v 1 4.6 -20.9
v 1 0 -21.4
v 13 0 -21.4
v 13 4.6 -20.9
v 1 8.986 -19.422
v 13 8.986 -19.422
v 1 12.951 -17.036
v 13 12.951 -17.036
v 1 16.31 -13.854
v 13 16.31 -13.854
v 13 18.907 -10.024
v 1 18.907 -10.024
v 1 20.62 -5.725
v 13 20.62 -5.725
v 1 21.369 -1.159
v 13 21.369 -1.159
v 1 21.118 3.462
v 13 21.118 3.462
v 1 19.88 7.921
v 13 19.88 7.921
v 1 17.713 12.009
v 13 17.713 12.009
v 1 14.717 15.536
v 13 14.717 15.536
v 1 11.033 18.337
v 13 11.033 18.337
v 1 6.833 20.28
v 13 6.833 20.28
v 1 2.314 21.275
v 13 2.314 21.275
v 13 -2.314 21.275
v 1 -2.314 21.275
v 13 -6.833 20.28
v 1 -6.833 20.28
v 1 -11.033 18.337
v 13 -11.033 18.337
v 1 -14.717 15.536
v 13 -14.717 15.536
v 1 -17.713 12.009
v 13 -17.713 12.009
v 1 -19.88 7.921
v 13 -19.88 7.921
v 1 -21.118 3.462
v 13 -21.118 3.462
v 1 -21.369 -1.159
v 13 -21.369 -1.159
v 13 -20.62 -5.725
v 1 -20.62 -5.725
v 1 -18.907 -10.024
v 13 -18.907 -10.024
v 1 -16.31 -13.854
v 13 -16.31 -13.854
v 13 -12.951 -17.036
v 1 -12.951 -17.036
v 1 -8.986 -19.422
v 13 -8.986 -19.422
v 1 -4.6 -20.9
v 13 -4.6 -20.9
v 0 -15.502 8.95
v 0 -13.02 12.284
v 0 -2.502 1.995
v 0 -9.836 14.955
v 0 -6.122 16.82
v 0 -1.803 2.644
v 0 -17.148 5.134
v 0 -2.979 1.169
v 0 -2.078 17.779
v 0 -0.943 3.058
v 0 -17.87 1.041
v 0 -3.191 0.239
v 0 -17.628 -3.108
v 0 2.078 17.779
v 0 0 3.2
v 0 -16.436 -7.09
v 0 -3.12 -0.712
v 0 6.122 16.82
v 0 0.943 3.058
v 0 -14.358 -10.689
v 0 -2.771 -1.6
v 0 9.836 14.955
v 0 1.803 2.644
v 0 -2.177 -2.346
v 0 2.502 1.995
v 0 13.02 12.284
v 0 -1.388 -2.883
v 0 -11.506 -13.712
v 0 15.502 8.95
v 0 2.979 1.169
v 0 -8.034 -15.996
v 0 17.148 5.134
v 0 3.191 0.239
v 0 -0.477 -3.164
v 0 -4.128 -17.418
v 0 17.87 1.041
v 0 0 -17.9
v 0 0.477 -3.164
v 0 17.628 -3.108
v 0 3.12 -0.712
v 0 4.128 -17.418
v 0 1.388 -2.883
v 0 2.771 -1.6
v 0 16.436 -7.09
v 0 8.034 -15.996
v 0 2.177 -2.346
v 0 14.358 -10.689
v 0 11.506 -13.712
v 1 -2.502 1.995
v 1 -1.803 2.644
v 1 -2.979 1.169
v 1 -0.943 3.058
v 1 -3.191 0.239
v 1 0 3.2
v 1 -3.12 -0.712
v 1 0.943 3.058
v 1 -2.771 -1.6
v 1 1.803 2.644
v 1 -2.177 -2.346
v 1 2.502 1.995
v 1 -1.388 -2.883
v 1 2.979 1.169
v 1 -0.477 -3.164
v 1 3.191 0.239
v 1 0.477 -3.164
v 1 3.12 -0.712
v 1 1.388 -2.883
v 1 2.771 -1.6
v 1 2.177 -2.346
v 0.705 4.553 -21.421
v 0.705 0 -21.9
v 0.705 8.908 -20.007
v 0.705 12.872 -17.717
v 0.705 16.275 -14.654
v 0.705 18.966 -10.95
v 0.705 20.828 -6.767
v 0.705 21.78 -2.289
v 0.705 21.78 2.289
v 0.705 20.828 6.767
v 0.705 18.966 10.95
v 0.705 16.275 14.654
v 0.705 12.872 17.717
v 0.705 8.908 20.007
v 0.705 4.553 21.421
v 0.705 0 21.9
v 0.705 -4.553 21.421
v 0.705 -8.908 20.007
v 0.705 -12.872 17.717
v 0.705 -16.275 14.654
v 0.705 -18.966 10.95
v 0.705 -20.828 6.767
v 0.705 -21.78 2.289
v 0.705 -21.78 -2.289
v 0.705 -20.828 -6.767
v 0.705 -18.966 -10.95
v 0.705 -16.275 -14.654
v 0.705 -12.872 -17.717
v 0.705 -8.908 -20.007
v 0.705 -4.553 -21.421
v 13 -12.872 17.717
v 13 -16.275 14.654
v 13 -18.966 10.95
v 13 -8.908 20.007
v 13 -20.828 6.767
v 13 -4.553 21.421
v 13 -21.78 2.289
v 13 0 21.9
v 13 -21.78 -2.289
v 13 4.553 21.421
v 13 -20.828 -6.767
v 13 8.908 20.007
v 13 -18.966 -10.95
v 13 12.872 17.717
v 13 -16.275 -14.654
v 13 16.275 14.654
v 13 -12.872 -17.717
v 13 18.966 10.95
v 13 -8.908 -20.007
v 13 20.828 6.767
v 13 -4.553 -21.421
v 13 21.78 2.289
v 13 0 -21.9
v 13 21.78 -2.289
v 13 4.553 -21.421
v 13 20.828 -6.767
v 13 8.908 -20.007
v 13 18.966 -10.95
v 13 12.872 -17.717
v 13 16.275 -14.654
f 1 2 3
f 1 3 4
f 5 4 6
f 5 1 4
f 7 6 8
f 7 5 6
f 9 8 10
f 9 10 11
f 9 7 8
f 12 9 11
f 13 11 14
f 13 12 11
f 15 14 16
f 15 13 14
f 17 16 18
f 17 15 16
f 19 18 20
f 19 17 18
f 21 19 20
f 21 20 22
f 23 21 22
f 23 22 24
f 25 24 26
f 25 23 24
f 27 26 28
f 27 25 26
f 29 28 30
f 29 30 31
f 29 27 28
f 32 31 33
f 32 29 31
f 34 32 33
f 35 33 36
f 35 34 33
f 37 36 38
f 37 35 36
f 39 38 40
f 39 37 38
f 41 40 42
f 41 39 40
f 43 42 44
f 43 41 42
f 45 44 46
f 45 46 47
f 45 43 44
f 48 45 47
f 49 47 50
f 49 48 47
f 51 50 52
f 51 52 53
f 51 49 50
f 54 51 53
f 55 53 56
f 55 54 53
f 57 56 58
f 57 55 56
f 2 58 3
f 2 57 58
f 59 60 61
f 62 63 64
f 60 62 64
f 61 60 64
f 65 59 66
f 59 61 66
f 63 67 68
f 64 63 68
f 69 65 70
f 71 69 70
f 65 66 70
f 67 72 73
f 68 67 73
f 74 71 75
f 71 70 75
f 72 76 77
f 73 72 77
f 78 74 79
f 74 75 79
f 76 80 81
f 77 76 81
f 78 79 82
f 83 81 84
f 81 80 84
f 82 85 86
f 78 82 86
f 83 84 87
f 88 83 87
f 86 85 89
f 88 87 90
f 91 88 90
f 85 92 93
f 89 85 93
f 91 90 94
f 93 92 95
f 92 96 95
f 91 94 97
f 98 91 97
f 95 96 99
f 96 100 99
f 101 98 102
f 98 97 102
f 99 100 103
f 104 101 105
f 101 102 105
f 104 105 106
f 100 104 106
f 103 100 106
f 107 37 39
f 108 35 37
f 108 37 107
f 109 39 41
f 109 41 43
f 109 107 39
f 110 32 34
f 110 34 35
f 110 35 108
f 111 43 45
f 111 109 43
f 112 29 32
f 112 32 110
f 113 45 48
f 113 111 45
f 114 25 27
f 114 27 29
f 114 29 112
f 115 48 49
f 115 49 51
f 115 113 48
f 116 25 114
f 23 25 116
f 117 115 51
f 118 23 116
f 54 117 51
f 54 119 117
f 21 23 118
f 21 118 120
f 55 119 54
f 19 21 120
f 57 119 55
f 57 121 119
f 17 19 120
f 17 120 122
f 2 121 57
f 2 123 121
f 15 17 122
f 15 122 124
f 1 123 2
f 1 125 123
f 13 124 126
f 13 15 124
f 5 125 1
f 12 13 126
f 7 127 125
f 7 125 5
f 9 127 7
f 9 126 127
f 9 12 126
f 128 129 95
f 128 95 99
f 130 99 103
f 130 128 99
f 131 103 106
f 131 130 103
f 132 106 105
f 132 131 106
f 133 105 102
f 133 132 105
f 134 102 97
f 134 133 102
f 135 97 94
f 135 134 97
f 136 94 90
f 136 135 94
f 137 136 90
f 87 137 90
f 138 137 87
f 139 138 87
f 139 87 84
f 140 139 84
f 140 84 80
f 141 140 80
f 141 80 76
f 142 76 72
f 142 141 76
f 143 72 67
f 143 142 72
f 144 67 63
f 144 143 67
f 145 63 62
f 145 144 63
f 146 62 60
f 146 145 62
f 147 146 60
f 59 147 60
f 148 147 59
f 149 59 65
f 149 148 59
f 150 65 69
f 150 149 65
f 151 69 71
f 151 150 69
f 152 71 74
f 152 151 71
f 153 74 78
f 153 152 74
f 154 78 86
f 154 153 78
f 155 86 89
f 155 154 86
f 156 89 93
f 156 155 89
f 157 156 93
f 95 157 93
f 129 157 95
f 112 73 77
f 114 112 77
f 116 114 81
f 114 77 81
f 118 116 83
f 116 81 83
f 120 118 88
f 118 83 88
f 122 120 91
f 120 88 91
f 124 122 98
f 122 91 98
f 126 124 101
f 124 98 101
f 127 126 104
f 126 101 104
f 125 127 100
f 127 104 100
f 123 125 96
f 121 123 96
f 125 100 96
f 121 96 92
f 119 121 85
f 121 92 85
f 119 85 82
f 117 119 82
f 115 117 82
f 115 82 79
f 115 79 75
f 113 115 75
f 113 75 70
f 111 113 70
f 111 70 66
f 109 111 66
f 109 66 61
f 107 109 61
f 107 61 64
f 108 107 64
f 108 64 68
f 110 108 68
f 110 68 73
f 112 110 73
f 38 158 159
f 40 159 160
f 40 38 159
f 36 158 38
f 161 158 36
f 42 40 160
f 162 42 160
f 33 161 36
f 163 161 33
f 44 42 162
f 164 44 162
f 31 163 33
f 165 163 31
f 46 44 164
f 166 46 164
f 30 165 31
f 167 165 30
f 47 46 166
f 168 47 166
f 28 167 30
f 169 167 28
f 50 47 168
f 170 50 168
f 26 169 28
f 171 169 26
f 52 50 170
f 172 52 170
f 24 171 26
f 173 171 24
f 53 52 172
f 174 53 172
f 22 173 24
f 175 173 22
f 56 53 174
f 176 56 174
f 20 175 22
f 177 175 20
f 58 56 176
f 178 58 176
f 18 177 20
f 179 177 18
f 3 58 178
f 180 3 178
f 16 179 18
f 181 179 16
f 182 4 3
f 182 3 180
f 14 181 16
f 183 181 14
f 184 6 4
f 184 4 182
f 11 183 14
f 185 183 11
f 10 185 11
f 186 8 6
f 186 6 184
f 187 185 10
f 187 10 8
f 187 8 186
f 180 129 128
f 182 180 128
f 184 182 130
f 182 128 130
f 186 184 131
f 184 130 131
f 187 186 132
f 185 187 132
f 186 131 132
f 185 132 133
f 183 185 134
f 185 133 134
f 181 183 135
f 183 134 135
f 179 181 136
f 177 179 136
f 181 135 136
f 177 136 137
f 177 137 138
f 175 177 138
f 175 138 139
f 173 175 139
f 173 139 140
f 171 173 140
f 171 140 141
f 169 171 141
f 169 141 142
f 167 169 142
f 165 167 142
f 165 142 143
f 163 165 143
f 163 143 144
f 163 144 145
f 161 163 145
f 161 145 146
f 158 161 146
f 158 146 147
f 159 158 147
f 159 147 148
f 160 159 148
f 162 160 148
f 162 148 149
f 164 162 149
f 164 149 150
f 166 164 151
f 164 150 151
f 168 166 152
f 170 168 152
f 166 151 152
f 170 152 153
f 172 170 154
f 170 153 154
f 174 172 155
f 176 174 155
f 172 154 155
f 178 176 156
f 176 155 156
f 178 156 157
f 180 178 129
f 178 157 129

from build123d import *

# Parameters (mm, degrees)
SKETCH1_R           = 21.9
BOSS_EXTRUDE1_DEPTH = 1
SKETCH2_R           = 21.9
SKETCH2_R_2         = 21.4
BOSS_EXTRUDE2_DEPTH = 12
SKETCH3_R           = 3.2
CUT_EXTRUDE1_DEPTH  = 12
CHAMFER1_SIZE       = 4
CHAMFER1_SIZE2      = 0.705307923


with BuildPart() as part:
    # Sketch1 → Boss-Extrude1 (new body)
    with BuildSketch(Plane.YZ):
        with Locations(Location((0, 0, 0), (0, 0, 270))):
            Circle(SKETCH1_R)
    extrude(amount=BOSS_EXTRUDE1_DEPTH)

    # Sketch2 → Boss-Extrude2 (add)
    with BuildSketch(Plane.YZ.offset(1)):
        with Locations(Location((0, 0, 0), (0, 0, 270))):
            Circle(SKETCH2_R)
        with Locations(Location((0, 0, 0), (0, 0, 270))):
            Circle(SKETCH2_R_2, mode=Mode.SUBTRACT)
    extrude(amount=BOSS_EXTRUDE2_DEPTH)

    # Sketch3 → Cut-Extrude1 (cut)
    with BuildSketch(Plane(origin=(0, 0, 0), x_dir=(0, -1, 0), z_dir=(-1, 0, 0))):
        with Locations(Location((0, 0, 0), (0, 0, 90))):
            Circle(SKETCH3_R)
    extrude(amount=-CUT_EXTRUDE1_DEPTH, mode=Mode.SUBTRACT)

    # Chamfer1
    chamfer1_edges = [part.edges().sort_by_distance(p)[0] for p in [
        (0, 0, 21.9),
    ]]
    chamfer1_side = [part.faces().sort_by_distance(p)[0] for p in [
        (0, 0, 21.28057446),
    ]]
    chamfer(chamfer1_edges, length=CHAMFER1_SIZE, length2=CHAMFER1_SIZE2, reference=chamfer1_side[0])


solid = part.part
